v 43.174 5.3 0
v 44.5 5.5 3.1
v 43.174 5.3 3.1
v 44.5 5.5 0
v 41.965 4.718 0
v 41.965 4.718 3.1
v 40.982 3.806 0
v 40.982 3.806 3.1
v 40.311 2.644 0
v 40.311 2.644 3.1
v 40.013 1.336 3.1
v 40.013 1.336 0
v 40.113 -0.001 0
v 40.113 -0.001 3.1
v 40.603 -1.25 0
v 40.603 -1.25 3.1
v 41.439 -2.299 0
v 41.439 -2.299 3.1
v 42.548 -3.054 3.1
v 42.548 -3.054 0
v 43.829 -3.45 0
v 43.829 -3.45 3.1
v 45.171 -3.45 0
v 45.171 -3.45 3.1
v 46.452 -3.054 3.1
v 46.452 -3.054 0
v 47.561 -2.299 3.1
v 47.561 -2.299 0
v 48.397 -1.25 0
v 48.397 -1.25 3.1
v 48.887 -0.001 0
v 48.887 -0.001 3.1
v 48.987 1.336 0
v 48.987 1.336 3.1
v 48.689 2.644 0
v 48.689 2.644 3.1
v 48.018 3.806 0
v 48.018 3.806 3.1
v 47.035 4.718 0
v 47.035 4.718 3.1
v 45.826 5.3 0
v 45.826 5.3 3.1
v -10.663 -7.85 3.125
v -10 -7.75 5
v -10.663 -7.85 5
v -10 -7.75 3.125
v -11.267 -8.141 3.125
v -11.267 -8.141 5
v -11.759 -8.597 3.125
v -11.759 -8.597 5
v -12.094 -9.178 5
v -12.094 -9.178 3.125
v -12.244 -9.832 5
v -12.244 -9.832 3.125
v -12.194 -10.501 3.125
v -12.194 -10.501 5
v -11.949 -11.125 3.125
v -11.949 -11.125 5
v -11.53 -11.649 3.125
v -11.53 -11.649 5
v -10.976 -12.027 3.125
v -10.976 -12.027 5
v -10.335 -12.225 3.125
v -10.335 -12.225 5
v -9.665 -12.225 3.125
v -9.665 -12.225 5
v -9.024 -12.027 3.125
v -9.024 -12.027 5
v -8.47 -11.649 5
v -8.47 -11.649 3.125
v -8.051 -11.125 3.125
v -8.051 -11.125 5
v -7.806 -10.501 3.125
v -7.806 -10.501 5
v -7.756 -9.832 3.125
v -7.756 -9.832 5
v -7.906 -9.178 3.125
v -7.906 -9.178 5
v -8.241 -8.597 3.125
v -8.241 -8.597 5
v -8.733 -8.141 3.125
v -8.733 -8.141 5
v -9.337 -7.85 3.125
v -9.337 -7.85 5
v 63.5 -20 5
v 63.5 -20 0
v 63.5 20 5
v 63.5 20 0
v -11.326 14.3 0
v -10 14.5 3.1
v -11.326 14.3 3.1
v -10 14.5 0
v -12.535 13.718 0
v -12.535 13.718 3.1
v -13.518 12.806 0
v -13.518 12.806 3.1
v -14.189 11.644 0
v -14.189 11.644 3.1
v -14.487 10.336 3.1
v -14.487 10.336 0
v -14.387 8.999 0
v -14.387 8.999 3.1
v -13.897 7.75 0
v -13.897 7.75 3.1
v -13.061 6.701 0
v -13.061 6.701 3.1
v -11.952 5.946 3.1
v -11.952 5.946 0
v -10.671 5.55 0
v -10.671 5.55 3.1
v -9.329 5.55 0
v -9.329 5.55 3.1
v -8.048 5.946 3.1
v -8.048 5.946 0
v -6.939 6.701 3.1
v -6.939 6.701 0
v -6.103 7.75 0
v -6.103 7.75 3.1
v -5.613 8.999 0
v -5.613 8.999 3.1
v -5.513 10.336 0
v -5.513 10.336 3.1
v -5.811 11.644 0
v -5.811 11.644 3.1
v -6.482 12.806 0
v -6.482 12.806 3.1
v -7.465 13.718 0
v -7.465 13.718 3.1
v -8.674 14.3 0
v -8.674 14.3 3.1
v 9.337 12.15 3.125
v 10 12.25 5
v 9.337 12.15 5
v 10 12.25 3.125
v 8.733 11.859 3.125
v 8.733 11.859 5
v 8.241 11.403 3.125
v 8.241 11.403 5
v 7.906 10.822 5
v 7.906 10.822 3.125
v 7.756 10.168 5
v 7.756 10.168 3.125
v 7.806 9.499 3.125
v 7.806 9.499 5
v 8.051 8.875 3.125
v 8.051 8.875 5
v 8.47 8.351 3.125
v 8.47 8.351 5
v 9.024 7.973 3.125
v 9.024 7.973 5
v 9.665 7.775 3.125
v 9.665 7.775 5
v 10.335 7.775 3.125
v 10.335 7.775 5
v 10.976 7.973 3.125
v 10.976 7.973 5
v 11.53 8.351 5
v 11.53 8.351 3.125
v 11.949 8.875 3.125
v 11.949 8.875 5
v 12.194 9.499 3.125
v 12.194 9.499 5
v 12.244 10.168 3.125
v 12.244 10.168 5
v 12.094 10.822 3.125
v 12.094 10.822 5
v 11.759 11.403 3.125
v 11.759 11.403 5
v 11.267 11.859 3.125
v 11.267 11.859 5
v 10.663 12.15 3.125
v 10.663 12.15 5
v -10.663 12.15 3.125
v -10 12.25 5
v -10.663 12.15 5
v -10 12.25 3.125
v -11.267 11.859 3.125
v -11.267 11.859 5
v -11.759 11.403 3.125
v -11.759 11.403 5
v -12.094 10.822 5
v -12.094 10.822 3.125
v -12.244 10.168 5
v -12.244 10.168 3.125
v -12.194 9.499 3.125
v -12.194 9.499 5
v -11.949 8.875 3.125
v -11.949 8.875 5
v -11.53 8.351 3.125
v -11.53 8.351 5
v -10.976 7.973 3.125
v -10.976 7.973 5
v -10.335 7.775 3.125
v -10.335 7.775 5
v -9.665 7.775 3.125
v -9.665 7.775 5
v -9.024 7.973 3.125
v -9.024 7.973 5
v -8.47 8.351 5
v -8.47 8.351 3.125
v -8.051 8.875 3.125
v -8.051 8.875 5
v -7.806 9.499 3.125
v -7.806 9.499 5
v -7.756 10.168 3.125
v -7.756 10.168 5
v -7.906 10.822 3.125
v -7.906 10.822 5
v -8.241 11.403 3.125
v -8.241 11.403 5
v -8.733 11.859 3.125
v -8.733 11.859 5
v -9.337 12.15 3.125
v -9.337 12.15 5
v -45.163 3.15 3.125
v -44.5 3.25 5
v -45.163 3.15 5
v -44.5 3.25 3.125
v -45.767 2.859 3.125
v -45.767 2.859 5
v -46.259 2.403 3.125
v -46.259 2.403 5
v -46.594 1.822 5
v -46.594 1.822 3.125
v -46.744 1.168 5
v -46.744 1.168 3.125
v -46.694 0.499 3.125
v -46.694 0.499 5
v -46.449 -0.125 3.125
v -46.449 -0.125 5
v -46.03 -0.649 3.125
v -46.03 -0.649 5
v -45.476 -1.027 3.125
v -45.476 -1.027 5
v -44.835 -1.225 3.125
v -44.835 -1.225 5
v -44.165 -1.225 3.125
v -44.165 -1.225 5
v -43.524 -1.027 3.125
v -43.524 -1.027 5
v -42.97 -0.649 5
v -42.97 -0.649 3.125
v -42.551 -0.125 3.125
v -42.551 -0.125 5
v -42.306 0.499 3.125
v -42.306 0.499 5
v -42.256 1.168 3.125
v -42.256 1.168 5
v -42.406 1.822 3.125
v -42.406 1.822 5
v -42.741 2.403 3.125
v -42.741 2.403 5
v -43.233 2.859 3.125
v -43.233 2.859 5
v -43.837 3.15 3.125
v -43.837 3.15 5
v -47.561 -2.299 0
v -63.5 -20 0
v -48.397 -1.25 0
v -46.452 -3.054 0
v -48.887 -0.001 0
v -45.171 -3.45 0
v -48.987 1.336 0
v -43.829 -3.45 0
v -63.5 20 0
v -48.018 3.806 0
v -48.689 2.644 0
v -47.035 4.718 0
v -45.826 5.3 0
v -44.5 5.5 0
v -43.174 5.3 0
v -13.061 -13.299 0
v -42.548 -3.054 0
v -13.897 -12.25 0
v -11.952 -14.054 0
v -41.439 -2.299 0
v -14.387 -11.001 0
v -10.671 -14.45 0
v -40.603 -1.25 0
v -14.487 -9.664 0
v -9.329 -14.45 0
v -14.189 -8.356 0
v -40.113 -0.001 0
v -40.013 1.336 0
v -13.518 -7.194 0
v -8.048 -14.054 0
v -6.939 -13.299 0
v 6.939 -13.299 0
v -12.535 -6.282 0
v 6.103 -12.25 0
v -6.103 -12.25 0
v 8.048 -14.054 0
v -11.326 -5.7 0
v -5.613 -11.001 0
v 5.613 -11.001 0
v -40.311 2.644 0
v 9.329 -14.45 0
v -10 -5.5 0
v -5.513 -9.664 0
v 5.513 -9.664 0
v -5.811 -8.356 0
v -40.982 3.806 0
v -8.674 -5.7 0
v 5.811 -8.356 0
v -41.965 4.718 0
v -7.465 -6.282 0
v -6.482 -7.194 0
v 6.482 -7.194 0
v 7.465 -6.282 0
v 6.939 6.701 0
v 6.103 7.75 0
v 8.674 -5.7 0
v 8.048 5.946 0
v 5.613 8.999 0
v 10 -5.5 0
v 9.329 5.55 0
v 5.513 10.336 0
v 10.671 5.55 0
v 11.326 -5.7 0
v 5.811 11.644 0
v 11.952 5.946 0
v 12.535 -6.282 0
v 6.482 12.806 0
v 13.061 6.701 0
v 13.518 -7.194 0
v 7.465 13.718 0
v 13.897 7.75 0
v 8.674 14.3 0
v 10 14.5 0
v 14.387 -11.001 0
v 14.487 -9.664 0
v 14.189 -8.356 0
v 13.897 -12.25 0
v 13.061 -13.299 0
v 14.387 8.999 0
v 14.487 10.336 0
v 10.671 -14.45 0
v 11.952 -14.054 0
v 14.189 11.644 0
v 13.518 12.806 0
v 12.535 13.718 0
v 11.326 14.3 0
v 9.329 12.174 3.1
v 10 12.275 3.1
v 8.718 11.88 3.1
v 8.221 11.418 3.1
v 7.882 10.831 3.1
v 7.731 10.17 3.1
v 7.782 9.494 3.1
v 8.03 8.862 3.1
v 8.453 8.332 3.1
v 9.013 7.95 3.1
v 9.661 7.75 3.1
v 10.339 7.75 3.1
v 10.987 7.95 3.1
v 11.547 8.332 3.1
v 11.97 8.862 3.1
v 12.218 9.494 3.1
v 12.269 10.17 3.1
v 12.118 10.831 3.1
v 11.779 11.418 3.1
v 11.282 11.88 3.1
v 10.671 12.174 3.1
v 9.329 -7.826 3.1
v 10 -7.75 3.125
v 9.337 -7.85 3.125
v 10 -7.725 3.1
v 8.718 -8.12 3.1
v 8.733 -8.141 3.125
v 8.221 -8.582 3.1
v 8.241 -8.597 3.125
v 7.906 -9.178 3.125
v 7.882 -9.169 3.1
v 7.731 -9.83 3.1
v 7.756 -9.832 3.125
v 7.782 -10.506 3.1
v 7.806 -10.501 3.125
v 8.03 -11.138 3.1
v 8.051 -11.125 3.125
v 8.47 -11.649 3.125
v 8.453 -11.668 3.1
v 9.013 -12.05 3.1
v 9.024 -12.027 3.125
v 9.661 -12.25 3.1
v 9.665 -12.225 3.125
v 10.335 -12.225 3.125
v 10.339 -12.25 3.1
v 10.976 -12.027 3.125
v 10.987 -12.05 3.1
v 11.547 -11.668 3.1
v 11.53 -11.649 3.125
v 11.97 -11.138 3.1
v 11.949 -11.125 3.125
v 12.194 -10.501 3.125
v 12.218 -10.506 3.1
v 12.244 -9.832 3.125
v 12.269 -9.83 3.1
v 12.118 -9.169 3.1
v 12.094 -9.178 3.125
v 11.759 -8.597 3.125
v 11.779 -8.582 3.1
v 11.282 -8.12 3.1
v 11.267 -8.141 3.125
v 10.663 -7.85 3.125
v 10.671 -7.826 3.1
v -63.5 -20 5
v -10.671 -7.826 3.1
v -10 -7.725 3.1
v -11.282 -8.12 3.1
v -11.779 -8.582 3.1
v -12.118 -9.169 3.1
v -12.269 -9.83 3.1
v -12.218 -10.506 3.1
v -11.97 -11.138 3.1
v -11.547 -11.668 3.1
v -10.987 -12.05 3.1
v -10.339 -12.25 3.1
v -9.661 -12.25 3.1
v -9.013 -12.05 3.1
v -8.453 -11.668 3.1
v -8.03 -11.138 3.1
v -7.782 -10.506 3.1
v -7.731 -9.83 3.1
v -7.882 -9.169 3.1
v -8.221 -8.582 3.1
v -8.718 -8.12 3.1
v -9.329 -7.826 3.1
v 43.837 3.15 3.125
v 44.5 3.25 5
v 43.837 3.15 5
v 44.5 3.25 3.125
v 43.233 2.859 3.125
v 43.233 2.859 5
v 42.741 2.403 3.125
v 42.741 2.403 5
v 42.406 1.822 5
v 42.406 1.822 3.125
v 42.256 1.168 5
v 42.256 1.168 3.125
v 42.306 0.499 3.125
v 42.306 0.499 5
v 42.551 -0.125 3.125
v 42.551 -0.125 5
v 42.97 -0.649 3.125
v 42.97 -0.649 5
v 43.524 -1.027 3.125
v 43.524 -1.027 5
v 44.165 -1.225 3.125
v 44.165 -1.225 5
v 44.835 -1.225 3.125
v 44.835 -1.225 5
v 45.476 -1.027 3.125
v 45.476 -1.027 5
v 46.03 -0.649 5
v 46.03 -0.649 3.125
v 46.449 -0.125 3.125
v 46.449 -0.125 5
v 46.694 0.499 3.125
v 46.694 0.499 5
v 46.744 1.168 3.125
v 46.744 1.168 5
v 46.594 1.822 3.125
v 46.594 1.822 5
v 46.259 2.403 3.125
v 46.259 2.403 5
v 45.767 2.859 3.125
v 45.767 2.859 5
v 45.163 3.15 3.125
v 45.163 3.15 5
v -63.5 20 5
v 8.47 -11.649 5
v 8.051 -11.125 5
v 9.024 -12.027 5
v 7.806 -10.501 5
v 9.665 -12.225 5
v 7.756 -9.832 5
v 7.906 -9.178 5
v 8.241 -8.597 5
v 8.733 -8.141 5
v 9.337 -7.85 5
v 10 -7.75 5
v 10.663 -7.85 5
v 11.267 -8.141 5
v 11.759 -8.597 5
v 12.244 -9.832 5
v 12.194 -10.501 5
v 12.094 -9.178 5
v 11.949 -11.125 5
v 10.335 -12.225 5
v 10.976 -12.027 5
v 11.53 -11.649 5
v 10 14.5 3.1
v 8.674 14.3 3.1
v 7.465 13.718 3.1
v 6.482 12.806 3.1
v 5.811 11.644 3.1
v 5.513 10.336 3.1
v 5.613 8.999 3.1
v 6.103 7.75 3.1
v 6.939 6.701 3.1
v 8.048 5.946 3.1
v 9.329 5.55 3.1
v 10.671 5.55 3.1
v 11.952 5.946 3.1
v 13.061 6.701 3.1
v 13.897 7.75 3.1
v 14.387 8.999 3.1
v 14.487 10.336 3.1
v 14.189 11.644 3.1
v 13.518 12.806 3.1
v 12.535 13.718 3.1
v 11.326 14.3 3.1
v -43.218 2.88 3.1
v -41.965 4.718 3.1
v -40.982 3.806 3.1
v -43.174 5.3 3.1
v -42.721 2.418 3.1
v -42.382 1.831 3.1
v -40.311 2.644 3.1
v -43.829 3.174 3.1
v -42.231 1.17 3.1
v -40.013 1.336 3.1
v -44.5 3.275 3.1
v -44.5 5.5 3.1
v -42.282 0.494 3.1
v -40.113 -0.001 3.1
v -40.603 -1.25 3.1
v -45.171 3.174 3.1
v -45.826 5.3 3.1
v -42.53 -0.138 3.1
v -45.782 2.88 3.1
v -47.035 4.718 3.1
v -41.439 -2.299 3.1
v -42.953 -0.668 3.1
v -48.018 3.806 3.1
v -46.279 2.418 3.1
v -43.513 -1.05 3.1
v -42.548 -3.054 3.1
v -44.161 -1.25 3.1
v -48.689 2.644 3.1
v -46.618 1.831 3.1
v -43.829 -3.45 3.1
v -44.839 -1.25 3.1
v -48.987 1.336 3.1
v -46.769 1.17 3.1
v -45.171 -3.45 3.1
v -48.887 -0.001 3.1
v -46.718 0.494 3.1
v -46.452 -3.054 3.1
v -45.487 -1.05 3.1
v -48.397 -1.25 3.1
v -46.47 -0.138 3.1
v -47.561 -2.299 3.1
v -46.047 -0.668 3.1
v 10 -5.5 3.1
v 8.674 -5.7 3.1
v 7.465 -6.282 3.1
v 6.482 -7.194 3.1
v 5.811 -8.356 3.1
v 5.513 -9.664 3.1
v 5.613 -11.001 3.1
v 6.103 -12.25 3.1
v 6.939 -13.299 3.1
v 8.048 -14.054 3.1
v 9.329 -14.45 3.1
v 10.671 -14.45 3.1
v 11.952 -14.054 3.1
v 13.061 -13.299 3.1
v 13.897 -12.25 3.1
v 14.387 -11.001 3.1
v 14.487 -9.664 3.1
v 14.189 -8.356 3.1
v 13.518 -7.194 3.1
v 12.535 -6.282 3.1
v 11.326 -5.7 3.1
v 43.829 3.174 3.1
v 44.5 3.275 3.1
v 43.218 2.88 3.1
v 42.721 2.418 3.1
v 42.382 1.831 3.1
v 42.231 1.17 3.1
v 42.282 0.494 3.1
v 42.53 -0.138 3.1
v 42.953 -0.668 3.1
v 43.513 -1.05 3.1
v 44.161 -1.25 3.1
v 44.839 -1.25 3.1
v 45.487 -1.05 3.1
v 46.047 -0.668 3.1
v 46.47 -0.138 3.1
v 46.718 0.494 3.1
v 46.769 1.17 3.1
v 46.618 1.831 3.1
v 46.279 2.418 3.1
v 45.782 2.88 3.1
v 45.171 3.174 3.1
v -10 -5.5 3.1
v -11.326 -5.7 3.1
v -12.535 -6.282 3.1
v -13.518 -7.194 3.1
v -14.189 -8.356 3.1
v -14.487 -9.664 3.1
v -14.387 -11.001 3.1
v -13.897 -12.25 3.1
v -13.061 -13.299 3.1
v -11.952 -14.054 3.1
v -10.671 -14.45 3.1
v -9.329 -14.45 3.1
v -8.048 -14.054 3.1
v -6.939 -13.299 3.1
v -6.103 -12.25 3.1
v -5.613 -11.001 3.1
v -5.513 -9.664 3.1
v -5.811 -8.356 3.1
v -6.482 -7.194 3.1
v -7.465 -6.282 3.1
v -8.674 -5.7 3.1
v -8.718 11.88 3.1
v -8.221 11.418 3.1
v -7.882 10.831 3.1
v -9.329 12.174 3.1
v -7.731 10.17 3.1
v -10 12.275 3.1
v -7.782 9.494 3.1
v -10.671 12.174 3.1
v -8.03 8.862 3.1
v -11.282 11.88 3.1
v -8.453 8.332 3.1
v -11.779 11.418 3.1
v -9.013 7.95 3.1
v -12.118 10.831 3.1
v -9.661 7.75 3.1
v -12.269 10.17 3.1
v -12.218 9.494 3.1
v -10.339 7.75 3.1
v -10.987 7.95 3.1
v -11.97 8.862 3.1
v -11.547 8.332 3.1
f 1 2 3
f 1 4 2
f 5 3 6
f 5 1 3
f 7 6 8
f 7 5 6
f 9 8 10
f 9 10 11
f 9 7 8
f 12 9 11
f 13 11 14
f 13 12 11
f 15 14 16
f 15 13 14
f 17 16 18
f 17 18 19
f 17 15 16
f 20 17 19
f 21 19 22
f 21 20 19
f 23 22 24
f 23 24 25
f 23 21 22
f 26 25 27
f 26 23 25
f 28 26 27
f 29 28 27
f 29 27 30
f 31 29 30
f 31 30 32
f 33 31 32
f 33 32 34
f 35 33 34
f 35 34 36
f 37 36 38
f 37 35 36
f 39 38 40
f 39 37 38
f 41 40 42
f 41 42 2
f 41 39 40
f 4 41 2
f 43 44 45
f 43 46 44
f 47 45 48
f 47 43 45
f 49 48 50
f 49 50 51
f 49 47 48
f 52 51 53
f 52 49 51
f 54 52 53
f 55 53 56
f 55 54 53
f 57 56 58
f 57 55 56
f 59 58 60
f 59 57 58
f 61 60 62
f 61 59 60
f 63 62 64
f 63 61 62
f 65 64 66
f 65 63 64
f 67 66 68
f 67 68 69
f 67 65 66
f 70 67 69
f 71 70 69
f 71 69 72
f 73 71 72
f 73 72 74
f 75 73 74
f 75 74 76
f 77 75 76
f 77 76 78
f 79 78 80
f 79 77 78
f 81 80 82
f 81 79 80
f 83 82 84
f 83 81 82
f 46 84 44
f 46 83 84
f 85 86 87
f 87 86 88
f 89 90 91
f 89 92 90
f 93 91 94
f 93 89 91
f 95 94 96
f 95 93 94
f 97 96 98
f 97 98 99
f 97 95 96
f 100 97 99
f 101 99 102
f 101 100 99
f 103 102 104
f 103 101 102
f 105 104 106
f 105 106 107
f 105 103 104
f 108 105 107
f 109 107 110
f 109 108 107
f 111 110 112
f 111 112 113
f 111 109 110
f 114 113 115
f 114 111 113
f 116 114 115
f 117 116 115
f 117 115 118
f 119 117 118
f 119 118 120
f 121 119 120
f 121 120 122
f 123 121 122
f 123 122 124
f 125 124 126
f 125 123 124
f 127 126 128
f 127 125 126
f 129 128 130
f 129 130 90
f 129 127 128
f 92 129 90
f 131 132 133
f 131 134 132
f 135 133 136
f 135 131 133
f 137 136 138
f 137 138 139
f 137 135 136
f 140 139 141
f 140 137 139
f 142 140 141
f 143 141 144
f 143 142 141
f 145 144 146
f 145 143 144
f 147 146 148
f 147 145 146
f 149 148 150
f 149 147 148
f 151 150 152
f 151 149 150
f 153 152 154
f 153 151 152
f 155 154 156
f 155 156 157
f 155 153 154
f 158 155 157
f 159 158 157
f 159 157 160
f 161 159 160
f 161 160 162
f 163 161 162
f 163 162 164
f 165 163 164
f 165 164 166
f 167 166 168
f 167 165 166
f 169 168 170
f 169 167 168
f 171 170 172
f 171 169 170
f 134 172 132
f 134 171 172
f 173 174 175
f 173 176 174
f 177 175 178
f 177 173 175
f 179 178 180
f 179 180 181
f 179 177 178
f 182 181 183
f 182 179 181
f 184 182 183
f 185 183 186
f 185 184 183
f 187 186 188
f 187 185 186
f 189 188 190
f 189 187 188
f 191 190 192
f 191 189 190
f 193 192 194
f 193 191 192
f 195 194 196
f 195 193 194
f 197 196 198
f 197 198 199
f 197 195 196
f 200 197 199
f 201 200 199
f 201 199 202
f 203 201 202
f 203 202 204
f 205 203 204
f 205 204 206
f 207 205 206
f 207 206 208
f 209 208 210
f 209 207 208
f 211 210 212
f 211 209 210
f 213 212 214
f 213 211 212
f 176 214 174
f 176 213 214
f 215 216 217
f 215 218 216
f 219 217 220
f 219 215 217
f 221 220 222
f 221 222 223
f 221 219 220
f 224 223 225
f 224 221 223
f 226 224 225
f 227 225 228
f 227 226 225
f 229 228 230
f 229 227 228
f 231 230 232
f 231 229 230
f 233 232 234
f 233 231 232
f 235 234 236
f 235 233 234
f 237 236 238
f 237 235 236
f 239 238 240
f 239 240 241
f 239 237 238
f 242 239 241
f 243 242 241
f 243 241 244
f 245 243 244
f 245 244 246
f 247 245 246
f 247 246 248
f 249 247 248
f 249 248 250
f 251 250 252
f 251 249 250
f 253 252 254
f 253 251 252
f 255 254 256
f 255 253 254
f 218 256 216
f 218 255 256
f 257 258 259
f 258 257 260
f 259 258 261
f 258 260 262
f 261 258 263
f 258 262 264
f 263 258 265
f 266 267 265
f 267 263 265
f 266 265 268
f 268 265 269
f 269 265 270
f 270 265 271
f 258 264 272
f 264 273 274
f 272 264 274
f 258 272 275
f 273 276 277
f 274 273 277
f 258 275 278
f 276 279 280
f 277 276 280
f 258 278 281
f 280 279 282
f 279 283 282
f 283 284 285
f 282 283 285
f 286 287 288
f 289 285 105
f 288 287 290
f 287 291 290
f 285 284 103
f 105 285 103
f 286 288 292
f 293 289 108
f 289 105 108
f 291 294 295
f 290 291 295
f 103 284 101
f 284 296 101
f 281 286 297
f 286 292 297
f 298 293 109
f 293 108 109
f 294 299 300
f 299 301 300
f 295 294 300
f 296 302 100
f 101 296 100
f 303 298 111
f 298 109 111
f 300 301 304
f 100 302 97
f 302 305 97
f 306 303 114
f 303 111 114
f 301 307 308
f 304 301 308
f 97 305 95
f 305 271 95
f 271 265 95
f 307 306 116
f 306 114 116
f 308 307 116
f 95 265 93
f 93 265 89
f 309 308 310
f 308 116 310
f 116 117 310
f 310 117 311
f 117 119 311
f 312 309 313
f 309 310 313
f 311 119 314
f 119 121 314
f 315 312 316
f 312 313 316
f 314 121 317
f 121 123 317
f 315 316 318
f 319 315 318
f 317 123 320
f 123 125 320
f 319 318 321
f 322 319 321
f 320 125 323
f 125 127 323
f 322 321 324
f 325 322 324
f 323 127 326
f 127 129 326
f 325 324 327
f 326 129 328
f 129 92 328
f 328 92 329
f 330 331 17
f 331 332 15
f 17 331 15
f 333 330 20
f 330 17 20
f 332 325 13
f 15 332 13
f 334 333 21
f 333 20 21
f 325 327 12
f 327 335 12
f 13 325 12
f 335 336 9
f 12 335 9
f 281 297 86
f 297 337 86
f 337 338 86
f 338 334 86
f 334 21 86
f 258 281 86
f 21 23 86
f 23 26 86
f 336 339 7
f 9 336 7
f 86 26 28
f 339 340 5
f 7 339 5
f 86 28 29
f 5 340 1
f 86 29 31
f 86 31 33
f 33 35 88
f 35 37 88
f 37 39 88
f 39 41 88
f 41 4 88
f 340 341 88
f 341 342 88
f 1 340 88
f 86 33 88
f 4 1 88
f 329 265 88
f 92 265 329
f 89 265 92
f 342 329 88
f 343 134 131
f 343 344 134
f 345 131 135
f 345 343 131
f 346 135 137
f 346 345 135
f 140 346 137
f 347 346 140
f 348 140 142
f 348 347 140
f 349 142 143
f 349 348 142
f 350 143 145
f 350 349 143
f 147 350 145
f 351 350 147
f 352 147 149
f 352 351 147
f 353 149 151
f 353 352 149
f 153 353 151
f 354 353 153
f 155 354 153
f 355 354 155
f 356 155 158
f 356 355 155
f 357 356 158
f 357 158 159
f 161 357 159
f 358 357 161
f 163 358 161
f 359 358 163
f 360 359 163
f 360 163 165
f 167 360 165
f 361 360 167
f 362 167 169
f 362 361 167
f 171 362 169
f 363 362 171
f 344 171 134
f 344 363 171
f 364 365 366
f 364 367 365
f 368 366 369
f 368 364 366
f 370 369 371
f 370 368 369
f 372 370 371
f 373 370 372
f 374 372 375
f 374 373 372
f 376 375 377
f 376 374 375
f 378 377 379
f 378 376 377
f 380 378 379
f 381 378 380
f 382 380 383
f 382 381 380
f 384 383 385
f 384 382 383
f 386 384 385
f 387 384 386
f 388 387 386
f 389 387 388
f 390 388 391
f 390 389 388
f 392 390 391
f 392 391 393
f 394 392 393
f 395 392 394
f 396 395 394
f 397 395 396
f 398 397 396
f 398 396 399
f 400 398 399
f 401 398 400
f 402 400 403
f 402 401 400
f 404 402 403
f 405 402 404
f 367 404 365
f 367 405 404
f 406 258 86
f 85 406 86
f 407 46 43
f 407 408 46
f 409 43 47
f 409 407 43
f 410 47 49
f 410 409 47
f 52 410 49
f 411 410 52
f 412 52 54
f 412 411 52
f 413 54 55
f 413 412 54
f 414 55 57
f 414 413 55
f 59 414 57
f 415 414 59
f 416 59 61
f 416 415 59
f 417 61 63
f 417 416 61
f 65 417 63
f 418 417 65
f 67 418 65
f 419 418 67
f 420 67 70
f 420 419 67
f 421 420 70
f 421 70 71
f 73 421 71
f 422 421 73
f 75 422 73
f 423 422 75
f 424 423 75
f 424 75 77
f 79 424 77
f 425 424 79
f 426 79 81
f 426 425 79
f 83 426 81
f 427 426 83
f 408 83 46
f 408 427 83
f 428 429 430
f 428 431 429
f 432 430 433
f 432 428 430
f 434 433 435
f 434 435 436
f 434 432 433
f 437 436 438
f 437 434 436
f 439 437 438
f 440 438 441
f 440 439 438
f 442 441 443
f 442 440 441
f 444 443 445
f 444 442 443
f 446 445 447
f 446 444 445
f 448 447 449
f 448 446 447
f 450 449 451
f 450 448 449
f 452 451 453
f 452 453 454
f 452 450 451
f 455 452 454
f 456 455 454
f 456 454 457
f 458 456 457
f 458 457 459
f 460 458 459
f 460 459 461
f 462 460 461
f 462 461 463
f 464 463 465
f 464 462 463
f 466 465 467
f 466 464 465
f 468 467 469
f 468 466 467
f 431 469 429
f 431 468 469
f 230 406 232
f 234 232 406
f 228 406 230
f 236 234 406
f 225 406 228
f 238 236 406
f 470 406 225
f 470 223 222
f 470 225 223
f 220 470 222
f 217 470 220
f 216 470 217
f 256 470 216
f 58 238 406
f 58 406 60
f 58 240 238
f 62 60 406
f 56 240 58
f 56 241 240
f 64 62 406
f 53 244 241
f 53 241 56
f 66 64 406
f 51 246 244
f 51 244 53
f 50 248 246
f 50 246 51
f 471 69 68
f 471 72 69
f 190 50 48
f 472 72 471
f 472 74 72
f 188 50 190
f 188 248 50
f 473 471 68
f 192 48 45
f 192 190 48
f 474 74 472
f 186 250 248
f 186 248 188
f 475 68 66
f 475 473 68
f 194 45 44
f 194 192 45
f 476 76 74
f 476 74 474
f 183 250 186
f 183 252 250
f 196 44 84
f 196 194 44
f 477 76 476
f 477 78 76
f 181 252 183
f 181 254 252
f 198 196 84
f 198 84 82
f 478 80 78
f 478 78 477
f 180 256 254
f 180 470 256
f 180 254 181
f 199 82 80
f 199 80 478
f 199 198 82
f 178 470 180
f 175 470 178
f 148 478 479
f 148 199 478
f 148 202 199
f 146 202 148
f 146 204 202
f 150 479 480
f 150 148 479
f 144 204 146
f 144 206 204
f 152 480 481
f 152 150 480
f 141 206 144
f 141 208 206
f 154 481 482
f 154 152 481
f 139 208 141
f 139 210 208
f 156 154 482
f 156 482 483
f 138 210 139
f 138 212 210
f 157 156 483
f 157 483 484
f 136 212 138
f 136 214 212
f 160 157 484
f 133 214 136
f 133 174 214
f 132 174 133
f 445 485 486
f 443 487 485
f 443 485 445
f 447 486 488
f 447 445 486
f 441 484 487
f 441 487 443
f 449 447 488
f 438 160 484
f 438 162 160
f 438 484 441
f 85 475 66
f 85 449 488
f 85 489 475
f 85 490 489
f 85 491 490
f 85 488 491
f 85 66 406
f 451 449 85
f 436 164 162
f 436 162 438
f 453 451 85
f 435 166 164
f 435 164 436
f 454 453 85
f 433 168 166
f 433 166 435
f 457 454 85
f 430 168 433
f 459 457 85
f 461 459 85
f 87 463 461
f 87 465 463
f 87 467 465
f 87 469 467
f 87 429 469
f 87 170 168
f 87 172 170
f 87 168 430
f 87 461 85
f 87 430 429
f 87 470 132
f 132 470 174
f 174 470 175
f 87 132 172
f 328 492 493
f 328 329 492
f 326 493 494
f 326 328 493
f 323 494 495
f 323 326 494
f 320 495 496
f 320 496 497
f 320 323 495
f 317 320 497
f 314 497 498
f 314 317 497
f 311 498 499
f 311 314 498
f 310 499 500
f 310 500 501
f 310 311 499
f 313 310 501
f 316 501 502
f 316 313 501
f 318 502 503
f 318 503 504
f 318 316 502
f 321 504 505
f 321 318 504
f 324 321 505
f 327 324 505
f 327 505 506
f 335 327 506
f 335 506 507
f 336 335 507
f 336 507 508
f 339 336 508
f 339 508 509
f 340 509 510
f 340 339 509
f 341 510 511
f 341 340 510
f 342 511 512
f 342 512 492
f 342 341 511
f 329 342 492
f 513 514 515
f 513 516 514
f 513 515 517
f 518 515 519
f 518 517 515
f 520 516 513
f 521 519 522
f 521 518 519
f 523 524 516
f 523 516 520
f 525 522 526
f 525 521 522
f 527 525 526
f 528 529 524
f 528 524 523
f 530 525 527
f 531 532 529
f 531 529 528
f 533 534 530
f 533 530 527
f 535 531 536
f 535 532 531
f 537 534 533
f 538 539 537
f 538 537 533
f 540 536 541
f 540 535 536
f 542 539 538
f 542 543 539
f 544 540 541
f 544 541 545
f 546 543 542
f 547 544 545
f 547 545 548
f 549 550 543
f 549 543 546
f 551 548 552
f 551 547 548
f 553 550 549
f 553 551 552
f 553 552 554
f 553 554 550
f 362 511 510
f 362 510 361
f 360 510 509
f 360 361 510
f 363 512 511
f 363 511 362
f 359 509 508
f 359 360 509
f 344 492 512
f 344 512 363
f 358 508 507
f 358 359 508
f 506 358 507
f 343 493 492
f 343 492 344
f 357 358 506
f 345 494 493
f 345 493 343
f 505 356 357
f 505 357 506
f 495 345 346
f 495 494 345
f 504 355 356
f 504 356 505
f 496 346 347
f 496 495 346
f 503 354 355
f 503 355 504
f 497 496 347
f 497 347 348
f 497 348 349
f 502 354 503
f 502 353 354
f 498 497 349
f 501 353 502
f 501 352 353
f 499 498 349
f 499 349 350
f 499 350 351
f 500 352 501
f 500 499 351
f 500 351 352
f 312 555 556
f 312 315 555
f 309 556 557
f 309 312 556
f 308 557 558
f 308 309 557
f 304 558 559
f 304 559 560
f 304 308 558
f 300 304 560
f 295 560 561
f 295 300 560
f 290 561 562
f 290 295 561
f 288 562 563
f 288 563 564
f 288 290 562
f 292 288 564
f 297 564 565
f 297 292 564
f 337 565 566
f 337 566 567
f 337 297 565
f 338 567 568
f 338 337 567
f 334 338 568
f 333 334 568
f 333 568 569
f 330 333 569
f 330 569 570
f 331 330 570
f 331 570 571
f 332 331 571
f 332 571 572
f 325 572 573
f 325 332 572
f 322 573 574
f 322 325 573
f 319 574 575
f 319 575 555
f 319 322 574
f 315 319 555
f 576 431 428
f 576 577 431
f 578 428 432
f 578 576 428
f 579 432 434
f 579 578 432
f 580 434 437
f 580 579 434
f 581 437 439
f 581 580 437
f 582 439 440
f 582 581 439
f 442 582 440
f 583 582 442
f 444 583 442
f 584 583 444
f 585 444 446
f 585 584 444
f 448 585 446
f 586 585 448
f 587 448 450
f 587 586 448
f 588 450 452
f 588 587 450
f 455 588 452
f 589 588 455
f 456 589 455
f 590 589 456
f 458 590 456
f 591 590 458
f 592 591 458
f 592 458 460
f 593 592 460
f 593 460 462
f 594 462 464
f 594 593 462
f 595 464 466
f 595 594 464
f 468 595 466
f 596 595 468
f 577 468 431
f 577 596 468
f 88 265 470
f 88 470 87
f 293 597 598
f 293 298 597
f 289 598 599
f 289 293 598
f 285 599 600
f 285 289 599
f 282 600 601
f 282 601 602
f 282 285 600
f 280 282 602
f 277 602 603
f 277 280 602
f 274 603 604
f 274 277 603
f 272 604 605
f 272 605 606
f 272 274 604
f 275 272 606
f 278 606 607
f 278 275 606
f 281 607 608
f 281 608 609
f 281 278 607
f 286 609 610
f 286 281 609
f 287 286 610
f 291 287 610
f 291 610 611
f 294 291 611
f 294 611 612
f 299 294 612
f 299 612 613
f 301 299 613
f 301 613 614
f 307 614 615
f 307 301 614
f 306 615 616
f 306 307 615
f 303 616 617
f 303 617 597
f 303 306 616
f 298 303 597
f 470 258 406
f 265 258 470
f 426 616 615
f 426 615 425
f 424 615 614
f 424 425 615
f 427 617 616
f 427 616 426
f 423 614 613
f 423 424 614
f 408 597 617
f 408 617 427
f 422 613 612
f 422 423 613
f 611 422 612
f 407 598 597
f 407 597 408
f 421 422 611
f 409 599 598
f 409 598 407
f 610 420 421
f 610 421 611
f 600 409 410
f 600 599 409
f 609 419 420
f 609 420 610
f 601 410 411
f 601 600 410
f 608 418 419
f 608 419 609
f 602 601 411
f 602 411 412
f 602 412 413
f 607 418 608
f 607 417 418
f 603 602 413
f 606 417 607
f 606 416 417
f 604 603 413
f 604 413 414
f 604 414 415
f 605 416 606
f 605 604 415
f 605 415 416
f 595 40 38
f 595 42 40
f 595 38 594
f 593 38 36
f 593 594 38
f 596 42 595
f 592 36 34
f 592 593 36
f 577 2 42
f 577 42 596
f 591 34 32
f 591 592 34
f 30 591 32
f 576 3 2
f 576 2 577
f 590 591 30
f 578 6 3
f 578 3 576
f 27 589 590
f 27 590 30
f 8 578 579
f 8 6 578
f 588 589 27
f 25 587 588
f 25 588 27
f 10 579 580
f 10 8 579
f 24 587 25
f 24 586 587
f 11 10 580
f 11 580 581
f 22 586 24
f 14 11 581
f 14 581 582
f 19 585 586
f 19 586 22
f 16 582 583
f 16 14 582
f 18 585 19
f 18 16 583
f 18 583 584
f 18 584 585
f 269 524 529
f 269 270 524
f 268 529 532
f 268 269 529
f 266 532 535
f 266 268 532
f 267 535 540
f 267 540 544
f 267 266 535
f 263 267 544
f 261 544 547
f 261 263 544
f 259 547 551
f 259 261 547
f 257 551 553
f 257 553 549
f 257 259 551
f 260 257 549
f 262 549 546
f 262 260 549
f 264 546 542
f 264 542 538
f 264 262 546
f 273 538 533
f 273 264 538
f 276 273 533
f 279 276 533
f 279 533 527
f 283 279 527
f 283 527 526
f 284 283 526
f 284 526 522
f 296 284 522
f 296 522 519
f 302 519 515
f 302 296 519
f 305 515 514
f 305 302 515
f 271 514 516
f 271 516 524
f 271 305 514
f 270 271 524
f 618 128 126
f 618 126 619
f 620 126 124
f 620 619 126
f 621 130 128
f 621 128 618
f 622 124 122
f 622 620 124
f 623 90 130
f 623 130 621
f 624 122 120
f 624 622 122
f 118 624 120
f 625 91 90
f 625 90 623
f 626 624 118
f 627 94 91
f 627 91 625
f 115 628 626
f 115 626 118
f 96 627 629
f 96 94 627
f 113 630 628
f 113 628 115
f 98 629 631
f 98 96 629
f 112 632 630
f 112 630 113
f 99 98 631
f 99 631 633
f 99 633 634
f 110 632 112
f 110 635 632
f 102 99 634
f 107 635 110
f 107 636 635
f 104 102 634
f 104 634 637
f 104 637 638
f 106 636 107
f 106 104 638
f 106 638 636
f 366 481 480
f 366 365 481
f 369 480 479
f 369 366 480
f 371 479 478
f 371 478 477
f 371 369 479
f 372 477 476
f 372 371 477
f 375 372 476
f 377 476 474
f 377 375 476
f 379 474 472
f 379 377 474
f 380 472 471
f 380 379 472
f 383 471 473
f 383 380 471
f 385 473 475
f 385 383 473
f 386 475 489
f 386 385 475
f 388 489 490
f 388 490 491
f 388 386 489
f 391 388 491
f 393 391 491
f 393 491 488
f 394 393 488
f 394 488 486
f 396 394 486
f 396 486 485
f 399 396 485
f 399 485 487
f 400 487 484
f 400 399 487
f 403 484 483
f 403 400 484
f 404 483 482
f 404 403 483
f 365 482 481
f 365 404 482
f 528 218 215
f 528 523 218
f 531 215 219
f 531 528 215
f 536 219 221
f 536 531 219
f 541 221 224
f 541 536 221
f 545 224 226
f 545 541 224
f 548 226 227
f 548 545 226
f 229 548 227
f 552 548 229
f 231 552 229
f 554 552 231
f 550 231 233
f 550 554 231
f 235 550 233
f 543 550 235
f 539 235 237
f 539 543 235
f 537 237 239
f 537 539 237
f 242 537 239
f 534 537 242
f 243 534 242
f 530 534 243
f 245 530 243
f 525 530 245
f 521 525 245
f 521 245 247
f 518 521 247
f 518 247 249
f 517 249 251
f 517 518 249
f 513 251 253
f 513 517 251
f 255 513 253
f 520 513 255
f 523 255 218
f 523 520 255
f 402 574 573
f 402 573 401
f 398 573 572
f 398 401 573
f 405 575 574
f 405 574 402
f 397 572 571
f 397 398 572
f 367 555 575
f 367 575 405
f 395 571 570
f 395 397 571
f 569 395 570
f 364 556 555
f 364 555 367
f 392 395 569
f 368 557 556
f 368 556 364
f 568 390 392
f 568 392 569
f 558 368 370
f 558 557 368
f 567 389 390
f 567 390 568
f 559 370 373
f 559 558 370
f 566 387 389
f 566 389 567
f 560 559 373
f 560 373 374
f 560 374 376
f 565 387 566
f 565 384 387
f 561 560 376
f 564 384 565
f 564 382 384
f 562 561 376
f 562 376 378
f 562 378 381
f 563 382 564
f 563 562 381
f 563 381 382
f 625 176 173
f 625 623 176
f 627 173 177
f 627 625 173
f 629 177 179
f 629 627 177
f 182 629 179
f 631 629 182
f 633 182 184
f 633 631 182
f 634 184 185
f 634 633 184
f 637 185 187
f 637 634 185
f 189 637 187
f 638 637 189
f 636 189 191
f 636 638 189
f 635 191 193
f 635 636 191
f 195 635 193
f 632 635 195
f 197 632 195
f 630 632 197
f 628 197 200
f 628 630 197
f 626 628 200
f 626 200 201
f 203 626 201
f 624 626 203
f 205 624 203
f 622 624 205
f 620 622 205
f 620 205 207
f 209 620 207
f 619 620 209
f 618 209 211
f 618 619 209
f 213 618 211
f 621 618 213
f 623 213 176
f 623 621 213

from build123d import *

# Parameters (mm, degrees)
ESQUISSE1_W                                  = 127
ESQUISSE1_H                                  = 40
BOSS_EXTRU_1_DEPTH                           = 5
CHAMBRAGE_POUR_VIS_T_TE_RONDE_BOMB_2_COUNT   = 2
CHAMBRAGE_POUR_VIS_T_TE_RONDE_BOMB_2_PITCH   = 89
D_GAGEMENT_M21_D                             = 2.4
CHAMBRAGE_POUR_VIS_T_TE_RONDE_BOMB_3_A_COUNT = 2
CHAMBRAGE_POUR_VIS_T_TE_RONDE_BOMB_3_A_PITCH = 20
CHAMBRAGE_POUR_VIS_T_TE_RONDE_BOMB_4_COUNT   = 2
CHAMBRAGE_POUR_VIS_T_TE_RONDE_BOMB_4_PITCH   = 20
CHAMBRAGE_POUR_VIS_T_TE_RONDE_BOMB_5_COUNT   = 2
CHAMBRAGE_POUR_VIS_T_TE_RONDE_BOMB_5_PITCH   = 28.284271247


with BuildPart() as part:
    # Esquisse1 → Boss.-Extru.1 (new body)
    with BuildSketch(Plane.XY):
        Rectangle(ESQUISSE1_W, ESQUISSE1_H)
    extrude(amount=BOSS_EXTRU_1_DEPTH)

    # Esquisse2 → Chambrage pour vis _ t_te ronde bomb_e M (revolve, cut)
    with BuildSketch(Plane(origin=(44.5, 1, 0), x_dir=(0, 1, 0), z_dir=(1, 0, 0))):
        Polygon((0, 0), (0, 5), (2.25, 5), (2.25, 3.125), (2.275, 3.1), (4.5, 3.1), (4.5, 0), align=None)
    chambrage_pour_vis_t_te_ronde_bomb_e_m = revolve(axis=Axis((44.5, 1, -6.35), (0, 0, 1)), mode=Mode.SUBTRACT)

    # Chambrage pour vis _ t_te ronde bomb 2: Chambrage pour vis _ t_te ronde bomb_e M ×2
    with Locations(*[(-i * CHAMBRAGE_POUR_VIS_T_TE_RONDE_BOMB_2_PITCH, 0, 0) for i in range(1, CHAMBRAGE_POUR_VIS_T_TE_RONDE_BOMB_2_COUNT)]):
        add(chambrage_pour_vis_t_te_ronde_bomb_e_m, mode=Mode.SUBTRACT)

    # Dégagement M21 (through all)
    with Locations(Plane.XY.offset(5)):
        with Locations((10, -10), (10, 10), (-10, -10), (-10, 10)):
            Hole(D_GAGEMENT_M21_D / 2)

    # Esquisse6 → Chambrage pour vis _ t_te ronde bomb 3 (revolve, cut)
    with BuildSketch(Plane(origin=(10, -10, 0), x_dir=(0, 1, 0), z_dir=(1, 0, 0))):
        Polygon((0, 0), (0, 5), (2.25, 5), (2.25, 3.125), (2.275, 3.1), (4.5, 3.1), (4.5, 0), align=None)
    chambrage_pour_vis_t_te_ronde_bomb_3 = revolve(axis=Axis((10, -10, -6.35), (0, 0, 1)), mode=Mode.SUBTRACT)

    # Chambrage pour vis _ t_te ronde bomb 3 a: Chambrage pour vis _ t_te ronde bomb 3 ×2
    with Locations(*[(0, i * CHAMBRAGE_POUR_VIS_T_TE_RONDE_BOMB_3_A_PITCH, 0) for i in range(1, CHAMBRAGE_POUR_VIS_T_TE_RONDE_BOMB_3_A_COUNT)]):
        add(chambrage_pour_vis_t_te_ronde_bomb_3, mode=Mode.SUBTRACT)

    # Chambrage pour vis _ t_te ronde bomb 4: Chambrage pour vis _ t_te ronde bomb 3 ×2
    with Locations(*[(-i * CHAMBRAGE_POUR_VIS_T_TE_RONDE_BOMB_4_PITCH, 0, 0) for i in range(1, CHAMBRAGE_POUR_VIS_T_TE_RONDE_BOMB_4_COUNT)]):
        add(chambrage_pour_vis_t_te_ronde_bomb_3, mode=Mode.SUBTRACT)

    # Chambrage pour vis _ t_te ronde bomb 5: Chambrage pour vis _ t_te ronde bomb 3 ×2
    with Locations(*[Vector(-0.7071067811865411, 0.707106781186554, 0) * (i * CHAMBRAGE_POUR_VIS_T_TE_RONDE_BOMB_5_PITCH) for i in range(1, CHAMBRAGE_POUR_VIS_T_TE_RONDE_BOMB_5_COUNT)]):
        add(chambrage_pour_vis_t_te_ronde_bomb_3, mode=Mode.SUBTRACT)


solid = part.part
